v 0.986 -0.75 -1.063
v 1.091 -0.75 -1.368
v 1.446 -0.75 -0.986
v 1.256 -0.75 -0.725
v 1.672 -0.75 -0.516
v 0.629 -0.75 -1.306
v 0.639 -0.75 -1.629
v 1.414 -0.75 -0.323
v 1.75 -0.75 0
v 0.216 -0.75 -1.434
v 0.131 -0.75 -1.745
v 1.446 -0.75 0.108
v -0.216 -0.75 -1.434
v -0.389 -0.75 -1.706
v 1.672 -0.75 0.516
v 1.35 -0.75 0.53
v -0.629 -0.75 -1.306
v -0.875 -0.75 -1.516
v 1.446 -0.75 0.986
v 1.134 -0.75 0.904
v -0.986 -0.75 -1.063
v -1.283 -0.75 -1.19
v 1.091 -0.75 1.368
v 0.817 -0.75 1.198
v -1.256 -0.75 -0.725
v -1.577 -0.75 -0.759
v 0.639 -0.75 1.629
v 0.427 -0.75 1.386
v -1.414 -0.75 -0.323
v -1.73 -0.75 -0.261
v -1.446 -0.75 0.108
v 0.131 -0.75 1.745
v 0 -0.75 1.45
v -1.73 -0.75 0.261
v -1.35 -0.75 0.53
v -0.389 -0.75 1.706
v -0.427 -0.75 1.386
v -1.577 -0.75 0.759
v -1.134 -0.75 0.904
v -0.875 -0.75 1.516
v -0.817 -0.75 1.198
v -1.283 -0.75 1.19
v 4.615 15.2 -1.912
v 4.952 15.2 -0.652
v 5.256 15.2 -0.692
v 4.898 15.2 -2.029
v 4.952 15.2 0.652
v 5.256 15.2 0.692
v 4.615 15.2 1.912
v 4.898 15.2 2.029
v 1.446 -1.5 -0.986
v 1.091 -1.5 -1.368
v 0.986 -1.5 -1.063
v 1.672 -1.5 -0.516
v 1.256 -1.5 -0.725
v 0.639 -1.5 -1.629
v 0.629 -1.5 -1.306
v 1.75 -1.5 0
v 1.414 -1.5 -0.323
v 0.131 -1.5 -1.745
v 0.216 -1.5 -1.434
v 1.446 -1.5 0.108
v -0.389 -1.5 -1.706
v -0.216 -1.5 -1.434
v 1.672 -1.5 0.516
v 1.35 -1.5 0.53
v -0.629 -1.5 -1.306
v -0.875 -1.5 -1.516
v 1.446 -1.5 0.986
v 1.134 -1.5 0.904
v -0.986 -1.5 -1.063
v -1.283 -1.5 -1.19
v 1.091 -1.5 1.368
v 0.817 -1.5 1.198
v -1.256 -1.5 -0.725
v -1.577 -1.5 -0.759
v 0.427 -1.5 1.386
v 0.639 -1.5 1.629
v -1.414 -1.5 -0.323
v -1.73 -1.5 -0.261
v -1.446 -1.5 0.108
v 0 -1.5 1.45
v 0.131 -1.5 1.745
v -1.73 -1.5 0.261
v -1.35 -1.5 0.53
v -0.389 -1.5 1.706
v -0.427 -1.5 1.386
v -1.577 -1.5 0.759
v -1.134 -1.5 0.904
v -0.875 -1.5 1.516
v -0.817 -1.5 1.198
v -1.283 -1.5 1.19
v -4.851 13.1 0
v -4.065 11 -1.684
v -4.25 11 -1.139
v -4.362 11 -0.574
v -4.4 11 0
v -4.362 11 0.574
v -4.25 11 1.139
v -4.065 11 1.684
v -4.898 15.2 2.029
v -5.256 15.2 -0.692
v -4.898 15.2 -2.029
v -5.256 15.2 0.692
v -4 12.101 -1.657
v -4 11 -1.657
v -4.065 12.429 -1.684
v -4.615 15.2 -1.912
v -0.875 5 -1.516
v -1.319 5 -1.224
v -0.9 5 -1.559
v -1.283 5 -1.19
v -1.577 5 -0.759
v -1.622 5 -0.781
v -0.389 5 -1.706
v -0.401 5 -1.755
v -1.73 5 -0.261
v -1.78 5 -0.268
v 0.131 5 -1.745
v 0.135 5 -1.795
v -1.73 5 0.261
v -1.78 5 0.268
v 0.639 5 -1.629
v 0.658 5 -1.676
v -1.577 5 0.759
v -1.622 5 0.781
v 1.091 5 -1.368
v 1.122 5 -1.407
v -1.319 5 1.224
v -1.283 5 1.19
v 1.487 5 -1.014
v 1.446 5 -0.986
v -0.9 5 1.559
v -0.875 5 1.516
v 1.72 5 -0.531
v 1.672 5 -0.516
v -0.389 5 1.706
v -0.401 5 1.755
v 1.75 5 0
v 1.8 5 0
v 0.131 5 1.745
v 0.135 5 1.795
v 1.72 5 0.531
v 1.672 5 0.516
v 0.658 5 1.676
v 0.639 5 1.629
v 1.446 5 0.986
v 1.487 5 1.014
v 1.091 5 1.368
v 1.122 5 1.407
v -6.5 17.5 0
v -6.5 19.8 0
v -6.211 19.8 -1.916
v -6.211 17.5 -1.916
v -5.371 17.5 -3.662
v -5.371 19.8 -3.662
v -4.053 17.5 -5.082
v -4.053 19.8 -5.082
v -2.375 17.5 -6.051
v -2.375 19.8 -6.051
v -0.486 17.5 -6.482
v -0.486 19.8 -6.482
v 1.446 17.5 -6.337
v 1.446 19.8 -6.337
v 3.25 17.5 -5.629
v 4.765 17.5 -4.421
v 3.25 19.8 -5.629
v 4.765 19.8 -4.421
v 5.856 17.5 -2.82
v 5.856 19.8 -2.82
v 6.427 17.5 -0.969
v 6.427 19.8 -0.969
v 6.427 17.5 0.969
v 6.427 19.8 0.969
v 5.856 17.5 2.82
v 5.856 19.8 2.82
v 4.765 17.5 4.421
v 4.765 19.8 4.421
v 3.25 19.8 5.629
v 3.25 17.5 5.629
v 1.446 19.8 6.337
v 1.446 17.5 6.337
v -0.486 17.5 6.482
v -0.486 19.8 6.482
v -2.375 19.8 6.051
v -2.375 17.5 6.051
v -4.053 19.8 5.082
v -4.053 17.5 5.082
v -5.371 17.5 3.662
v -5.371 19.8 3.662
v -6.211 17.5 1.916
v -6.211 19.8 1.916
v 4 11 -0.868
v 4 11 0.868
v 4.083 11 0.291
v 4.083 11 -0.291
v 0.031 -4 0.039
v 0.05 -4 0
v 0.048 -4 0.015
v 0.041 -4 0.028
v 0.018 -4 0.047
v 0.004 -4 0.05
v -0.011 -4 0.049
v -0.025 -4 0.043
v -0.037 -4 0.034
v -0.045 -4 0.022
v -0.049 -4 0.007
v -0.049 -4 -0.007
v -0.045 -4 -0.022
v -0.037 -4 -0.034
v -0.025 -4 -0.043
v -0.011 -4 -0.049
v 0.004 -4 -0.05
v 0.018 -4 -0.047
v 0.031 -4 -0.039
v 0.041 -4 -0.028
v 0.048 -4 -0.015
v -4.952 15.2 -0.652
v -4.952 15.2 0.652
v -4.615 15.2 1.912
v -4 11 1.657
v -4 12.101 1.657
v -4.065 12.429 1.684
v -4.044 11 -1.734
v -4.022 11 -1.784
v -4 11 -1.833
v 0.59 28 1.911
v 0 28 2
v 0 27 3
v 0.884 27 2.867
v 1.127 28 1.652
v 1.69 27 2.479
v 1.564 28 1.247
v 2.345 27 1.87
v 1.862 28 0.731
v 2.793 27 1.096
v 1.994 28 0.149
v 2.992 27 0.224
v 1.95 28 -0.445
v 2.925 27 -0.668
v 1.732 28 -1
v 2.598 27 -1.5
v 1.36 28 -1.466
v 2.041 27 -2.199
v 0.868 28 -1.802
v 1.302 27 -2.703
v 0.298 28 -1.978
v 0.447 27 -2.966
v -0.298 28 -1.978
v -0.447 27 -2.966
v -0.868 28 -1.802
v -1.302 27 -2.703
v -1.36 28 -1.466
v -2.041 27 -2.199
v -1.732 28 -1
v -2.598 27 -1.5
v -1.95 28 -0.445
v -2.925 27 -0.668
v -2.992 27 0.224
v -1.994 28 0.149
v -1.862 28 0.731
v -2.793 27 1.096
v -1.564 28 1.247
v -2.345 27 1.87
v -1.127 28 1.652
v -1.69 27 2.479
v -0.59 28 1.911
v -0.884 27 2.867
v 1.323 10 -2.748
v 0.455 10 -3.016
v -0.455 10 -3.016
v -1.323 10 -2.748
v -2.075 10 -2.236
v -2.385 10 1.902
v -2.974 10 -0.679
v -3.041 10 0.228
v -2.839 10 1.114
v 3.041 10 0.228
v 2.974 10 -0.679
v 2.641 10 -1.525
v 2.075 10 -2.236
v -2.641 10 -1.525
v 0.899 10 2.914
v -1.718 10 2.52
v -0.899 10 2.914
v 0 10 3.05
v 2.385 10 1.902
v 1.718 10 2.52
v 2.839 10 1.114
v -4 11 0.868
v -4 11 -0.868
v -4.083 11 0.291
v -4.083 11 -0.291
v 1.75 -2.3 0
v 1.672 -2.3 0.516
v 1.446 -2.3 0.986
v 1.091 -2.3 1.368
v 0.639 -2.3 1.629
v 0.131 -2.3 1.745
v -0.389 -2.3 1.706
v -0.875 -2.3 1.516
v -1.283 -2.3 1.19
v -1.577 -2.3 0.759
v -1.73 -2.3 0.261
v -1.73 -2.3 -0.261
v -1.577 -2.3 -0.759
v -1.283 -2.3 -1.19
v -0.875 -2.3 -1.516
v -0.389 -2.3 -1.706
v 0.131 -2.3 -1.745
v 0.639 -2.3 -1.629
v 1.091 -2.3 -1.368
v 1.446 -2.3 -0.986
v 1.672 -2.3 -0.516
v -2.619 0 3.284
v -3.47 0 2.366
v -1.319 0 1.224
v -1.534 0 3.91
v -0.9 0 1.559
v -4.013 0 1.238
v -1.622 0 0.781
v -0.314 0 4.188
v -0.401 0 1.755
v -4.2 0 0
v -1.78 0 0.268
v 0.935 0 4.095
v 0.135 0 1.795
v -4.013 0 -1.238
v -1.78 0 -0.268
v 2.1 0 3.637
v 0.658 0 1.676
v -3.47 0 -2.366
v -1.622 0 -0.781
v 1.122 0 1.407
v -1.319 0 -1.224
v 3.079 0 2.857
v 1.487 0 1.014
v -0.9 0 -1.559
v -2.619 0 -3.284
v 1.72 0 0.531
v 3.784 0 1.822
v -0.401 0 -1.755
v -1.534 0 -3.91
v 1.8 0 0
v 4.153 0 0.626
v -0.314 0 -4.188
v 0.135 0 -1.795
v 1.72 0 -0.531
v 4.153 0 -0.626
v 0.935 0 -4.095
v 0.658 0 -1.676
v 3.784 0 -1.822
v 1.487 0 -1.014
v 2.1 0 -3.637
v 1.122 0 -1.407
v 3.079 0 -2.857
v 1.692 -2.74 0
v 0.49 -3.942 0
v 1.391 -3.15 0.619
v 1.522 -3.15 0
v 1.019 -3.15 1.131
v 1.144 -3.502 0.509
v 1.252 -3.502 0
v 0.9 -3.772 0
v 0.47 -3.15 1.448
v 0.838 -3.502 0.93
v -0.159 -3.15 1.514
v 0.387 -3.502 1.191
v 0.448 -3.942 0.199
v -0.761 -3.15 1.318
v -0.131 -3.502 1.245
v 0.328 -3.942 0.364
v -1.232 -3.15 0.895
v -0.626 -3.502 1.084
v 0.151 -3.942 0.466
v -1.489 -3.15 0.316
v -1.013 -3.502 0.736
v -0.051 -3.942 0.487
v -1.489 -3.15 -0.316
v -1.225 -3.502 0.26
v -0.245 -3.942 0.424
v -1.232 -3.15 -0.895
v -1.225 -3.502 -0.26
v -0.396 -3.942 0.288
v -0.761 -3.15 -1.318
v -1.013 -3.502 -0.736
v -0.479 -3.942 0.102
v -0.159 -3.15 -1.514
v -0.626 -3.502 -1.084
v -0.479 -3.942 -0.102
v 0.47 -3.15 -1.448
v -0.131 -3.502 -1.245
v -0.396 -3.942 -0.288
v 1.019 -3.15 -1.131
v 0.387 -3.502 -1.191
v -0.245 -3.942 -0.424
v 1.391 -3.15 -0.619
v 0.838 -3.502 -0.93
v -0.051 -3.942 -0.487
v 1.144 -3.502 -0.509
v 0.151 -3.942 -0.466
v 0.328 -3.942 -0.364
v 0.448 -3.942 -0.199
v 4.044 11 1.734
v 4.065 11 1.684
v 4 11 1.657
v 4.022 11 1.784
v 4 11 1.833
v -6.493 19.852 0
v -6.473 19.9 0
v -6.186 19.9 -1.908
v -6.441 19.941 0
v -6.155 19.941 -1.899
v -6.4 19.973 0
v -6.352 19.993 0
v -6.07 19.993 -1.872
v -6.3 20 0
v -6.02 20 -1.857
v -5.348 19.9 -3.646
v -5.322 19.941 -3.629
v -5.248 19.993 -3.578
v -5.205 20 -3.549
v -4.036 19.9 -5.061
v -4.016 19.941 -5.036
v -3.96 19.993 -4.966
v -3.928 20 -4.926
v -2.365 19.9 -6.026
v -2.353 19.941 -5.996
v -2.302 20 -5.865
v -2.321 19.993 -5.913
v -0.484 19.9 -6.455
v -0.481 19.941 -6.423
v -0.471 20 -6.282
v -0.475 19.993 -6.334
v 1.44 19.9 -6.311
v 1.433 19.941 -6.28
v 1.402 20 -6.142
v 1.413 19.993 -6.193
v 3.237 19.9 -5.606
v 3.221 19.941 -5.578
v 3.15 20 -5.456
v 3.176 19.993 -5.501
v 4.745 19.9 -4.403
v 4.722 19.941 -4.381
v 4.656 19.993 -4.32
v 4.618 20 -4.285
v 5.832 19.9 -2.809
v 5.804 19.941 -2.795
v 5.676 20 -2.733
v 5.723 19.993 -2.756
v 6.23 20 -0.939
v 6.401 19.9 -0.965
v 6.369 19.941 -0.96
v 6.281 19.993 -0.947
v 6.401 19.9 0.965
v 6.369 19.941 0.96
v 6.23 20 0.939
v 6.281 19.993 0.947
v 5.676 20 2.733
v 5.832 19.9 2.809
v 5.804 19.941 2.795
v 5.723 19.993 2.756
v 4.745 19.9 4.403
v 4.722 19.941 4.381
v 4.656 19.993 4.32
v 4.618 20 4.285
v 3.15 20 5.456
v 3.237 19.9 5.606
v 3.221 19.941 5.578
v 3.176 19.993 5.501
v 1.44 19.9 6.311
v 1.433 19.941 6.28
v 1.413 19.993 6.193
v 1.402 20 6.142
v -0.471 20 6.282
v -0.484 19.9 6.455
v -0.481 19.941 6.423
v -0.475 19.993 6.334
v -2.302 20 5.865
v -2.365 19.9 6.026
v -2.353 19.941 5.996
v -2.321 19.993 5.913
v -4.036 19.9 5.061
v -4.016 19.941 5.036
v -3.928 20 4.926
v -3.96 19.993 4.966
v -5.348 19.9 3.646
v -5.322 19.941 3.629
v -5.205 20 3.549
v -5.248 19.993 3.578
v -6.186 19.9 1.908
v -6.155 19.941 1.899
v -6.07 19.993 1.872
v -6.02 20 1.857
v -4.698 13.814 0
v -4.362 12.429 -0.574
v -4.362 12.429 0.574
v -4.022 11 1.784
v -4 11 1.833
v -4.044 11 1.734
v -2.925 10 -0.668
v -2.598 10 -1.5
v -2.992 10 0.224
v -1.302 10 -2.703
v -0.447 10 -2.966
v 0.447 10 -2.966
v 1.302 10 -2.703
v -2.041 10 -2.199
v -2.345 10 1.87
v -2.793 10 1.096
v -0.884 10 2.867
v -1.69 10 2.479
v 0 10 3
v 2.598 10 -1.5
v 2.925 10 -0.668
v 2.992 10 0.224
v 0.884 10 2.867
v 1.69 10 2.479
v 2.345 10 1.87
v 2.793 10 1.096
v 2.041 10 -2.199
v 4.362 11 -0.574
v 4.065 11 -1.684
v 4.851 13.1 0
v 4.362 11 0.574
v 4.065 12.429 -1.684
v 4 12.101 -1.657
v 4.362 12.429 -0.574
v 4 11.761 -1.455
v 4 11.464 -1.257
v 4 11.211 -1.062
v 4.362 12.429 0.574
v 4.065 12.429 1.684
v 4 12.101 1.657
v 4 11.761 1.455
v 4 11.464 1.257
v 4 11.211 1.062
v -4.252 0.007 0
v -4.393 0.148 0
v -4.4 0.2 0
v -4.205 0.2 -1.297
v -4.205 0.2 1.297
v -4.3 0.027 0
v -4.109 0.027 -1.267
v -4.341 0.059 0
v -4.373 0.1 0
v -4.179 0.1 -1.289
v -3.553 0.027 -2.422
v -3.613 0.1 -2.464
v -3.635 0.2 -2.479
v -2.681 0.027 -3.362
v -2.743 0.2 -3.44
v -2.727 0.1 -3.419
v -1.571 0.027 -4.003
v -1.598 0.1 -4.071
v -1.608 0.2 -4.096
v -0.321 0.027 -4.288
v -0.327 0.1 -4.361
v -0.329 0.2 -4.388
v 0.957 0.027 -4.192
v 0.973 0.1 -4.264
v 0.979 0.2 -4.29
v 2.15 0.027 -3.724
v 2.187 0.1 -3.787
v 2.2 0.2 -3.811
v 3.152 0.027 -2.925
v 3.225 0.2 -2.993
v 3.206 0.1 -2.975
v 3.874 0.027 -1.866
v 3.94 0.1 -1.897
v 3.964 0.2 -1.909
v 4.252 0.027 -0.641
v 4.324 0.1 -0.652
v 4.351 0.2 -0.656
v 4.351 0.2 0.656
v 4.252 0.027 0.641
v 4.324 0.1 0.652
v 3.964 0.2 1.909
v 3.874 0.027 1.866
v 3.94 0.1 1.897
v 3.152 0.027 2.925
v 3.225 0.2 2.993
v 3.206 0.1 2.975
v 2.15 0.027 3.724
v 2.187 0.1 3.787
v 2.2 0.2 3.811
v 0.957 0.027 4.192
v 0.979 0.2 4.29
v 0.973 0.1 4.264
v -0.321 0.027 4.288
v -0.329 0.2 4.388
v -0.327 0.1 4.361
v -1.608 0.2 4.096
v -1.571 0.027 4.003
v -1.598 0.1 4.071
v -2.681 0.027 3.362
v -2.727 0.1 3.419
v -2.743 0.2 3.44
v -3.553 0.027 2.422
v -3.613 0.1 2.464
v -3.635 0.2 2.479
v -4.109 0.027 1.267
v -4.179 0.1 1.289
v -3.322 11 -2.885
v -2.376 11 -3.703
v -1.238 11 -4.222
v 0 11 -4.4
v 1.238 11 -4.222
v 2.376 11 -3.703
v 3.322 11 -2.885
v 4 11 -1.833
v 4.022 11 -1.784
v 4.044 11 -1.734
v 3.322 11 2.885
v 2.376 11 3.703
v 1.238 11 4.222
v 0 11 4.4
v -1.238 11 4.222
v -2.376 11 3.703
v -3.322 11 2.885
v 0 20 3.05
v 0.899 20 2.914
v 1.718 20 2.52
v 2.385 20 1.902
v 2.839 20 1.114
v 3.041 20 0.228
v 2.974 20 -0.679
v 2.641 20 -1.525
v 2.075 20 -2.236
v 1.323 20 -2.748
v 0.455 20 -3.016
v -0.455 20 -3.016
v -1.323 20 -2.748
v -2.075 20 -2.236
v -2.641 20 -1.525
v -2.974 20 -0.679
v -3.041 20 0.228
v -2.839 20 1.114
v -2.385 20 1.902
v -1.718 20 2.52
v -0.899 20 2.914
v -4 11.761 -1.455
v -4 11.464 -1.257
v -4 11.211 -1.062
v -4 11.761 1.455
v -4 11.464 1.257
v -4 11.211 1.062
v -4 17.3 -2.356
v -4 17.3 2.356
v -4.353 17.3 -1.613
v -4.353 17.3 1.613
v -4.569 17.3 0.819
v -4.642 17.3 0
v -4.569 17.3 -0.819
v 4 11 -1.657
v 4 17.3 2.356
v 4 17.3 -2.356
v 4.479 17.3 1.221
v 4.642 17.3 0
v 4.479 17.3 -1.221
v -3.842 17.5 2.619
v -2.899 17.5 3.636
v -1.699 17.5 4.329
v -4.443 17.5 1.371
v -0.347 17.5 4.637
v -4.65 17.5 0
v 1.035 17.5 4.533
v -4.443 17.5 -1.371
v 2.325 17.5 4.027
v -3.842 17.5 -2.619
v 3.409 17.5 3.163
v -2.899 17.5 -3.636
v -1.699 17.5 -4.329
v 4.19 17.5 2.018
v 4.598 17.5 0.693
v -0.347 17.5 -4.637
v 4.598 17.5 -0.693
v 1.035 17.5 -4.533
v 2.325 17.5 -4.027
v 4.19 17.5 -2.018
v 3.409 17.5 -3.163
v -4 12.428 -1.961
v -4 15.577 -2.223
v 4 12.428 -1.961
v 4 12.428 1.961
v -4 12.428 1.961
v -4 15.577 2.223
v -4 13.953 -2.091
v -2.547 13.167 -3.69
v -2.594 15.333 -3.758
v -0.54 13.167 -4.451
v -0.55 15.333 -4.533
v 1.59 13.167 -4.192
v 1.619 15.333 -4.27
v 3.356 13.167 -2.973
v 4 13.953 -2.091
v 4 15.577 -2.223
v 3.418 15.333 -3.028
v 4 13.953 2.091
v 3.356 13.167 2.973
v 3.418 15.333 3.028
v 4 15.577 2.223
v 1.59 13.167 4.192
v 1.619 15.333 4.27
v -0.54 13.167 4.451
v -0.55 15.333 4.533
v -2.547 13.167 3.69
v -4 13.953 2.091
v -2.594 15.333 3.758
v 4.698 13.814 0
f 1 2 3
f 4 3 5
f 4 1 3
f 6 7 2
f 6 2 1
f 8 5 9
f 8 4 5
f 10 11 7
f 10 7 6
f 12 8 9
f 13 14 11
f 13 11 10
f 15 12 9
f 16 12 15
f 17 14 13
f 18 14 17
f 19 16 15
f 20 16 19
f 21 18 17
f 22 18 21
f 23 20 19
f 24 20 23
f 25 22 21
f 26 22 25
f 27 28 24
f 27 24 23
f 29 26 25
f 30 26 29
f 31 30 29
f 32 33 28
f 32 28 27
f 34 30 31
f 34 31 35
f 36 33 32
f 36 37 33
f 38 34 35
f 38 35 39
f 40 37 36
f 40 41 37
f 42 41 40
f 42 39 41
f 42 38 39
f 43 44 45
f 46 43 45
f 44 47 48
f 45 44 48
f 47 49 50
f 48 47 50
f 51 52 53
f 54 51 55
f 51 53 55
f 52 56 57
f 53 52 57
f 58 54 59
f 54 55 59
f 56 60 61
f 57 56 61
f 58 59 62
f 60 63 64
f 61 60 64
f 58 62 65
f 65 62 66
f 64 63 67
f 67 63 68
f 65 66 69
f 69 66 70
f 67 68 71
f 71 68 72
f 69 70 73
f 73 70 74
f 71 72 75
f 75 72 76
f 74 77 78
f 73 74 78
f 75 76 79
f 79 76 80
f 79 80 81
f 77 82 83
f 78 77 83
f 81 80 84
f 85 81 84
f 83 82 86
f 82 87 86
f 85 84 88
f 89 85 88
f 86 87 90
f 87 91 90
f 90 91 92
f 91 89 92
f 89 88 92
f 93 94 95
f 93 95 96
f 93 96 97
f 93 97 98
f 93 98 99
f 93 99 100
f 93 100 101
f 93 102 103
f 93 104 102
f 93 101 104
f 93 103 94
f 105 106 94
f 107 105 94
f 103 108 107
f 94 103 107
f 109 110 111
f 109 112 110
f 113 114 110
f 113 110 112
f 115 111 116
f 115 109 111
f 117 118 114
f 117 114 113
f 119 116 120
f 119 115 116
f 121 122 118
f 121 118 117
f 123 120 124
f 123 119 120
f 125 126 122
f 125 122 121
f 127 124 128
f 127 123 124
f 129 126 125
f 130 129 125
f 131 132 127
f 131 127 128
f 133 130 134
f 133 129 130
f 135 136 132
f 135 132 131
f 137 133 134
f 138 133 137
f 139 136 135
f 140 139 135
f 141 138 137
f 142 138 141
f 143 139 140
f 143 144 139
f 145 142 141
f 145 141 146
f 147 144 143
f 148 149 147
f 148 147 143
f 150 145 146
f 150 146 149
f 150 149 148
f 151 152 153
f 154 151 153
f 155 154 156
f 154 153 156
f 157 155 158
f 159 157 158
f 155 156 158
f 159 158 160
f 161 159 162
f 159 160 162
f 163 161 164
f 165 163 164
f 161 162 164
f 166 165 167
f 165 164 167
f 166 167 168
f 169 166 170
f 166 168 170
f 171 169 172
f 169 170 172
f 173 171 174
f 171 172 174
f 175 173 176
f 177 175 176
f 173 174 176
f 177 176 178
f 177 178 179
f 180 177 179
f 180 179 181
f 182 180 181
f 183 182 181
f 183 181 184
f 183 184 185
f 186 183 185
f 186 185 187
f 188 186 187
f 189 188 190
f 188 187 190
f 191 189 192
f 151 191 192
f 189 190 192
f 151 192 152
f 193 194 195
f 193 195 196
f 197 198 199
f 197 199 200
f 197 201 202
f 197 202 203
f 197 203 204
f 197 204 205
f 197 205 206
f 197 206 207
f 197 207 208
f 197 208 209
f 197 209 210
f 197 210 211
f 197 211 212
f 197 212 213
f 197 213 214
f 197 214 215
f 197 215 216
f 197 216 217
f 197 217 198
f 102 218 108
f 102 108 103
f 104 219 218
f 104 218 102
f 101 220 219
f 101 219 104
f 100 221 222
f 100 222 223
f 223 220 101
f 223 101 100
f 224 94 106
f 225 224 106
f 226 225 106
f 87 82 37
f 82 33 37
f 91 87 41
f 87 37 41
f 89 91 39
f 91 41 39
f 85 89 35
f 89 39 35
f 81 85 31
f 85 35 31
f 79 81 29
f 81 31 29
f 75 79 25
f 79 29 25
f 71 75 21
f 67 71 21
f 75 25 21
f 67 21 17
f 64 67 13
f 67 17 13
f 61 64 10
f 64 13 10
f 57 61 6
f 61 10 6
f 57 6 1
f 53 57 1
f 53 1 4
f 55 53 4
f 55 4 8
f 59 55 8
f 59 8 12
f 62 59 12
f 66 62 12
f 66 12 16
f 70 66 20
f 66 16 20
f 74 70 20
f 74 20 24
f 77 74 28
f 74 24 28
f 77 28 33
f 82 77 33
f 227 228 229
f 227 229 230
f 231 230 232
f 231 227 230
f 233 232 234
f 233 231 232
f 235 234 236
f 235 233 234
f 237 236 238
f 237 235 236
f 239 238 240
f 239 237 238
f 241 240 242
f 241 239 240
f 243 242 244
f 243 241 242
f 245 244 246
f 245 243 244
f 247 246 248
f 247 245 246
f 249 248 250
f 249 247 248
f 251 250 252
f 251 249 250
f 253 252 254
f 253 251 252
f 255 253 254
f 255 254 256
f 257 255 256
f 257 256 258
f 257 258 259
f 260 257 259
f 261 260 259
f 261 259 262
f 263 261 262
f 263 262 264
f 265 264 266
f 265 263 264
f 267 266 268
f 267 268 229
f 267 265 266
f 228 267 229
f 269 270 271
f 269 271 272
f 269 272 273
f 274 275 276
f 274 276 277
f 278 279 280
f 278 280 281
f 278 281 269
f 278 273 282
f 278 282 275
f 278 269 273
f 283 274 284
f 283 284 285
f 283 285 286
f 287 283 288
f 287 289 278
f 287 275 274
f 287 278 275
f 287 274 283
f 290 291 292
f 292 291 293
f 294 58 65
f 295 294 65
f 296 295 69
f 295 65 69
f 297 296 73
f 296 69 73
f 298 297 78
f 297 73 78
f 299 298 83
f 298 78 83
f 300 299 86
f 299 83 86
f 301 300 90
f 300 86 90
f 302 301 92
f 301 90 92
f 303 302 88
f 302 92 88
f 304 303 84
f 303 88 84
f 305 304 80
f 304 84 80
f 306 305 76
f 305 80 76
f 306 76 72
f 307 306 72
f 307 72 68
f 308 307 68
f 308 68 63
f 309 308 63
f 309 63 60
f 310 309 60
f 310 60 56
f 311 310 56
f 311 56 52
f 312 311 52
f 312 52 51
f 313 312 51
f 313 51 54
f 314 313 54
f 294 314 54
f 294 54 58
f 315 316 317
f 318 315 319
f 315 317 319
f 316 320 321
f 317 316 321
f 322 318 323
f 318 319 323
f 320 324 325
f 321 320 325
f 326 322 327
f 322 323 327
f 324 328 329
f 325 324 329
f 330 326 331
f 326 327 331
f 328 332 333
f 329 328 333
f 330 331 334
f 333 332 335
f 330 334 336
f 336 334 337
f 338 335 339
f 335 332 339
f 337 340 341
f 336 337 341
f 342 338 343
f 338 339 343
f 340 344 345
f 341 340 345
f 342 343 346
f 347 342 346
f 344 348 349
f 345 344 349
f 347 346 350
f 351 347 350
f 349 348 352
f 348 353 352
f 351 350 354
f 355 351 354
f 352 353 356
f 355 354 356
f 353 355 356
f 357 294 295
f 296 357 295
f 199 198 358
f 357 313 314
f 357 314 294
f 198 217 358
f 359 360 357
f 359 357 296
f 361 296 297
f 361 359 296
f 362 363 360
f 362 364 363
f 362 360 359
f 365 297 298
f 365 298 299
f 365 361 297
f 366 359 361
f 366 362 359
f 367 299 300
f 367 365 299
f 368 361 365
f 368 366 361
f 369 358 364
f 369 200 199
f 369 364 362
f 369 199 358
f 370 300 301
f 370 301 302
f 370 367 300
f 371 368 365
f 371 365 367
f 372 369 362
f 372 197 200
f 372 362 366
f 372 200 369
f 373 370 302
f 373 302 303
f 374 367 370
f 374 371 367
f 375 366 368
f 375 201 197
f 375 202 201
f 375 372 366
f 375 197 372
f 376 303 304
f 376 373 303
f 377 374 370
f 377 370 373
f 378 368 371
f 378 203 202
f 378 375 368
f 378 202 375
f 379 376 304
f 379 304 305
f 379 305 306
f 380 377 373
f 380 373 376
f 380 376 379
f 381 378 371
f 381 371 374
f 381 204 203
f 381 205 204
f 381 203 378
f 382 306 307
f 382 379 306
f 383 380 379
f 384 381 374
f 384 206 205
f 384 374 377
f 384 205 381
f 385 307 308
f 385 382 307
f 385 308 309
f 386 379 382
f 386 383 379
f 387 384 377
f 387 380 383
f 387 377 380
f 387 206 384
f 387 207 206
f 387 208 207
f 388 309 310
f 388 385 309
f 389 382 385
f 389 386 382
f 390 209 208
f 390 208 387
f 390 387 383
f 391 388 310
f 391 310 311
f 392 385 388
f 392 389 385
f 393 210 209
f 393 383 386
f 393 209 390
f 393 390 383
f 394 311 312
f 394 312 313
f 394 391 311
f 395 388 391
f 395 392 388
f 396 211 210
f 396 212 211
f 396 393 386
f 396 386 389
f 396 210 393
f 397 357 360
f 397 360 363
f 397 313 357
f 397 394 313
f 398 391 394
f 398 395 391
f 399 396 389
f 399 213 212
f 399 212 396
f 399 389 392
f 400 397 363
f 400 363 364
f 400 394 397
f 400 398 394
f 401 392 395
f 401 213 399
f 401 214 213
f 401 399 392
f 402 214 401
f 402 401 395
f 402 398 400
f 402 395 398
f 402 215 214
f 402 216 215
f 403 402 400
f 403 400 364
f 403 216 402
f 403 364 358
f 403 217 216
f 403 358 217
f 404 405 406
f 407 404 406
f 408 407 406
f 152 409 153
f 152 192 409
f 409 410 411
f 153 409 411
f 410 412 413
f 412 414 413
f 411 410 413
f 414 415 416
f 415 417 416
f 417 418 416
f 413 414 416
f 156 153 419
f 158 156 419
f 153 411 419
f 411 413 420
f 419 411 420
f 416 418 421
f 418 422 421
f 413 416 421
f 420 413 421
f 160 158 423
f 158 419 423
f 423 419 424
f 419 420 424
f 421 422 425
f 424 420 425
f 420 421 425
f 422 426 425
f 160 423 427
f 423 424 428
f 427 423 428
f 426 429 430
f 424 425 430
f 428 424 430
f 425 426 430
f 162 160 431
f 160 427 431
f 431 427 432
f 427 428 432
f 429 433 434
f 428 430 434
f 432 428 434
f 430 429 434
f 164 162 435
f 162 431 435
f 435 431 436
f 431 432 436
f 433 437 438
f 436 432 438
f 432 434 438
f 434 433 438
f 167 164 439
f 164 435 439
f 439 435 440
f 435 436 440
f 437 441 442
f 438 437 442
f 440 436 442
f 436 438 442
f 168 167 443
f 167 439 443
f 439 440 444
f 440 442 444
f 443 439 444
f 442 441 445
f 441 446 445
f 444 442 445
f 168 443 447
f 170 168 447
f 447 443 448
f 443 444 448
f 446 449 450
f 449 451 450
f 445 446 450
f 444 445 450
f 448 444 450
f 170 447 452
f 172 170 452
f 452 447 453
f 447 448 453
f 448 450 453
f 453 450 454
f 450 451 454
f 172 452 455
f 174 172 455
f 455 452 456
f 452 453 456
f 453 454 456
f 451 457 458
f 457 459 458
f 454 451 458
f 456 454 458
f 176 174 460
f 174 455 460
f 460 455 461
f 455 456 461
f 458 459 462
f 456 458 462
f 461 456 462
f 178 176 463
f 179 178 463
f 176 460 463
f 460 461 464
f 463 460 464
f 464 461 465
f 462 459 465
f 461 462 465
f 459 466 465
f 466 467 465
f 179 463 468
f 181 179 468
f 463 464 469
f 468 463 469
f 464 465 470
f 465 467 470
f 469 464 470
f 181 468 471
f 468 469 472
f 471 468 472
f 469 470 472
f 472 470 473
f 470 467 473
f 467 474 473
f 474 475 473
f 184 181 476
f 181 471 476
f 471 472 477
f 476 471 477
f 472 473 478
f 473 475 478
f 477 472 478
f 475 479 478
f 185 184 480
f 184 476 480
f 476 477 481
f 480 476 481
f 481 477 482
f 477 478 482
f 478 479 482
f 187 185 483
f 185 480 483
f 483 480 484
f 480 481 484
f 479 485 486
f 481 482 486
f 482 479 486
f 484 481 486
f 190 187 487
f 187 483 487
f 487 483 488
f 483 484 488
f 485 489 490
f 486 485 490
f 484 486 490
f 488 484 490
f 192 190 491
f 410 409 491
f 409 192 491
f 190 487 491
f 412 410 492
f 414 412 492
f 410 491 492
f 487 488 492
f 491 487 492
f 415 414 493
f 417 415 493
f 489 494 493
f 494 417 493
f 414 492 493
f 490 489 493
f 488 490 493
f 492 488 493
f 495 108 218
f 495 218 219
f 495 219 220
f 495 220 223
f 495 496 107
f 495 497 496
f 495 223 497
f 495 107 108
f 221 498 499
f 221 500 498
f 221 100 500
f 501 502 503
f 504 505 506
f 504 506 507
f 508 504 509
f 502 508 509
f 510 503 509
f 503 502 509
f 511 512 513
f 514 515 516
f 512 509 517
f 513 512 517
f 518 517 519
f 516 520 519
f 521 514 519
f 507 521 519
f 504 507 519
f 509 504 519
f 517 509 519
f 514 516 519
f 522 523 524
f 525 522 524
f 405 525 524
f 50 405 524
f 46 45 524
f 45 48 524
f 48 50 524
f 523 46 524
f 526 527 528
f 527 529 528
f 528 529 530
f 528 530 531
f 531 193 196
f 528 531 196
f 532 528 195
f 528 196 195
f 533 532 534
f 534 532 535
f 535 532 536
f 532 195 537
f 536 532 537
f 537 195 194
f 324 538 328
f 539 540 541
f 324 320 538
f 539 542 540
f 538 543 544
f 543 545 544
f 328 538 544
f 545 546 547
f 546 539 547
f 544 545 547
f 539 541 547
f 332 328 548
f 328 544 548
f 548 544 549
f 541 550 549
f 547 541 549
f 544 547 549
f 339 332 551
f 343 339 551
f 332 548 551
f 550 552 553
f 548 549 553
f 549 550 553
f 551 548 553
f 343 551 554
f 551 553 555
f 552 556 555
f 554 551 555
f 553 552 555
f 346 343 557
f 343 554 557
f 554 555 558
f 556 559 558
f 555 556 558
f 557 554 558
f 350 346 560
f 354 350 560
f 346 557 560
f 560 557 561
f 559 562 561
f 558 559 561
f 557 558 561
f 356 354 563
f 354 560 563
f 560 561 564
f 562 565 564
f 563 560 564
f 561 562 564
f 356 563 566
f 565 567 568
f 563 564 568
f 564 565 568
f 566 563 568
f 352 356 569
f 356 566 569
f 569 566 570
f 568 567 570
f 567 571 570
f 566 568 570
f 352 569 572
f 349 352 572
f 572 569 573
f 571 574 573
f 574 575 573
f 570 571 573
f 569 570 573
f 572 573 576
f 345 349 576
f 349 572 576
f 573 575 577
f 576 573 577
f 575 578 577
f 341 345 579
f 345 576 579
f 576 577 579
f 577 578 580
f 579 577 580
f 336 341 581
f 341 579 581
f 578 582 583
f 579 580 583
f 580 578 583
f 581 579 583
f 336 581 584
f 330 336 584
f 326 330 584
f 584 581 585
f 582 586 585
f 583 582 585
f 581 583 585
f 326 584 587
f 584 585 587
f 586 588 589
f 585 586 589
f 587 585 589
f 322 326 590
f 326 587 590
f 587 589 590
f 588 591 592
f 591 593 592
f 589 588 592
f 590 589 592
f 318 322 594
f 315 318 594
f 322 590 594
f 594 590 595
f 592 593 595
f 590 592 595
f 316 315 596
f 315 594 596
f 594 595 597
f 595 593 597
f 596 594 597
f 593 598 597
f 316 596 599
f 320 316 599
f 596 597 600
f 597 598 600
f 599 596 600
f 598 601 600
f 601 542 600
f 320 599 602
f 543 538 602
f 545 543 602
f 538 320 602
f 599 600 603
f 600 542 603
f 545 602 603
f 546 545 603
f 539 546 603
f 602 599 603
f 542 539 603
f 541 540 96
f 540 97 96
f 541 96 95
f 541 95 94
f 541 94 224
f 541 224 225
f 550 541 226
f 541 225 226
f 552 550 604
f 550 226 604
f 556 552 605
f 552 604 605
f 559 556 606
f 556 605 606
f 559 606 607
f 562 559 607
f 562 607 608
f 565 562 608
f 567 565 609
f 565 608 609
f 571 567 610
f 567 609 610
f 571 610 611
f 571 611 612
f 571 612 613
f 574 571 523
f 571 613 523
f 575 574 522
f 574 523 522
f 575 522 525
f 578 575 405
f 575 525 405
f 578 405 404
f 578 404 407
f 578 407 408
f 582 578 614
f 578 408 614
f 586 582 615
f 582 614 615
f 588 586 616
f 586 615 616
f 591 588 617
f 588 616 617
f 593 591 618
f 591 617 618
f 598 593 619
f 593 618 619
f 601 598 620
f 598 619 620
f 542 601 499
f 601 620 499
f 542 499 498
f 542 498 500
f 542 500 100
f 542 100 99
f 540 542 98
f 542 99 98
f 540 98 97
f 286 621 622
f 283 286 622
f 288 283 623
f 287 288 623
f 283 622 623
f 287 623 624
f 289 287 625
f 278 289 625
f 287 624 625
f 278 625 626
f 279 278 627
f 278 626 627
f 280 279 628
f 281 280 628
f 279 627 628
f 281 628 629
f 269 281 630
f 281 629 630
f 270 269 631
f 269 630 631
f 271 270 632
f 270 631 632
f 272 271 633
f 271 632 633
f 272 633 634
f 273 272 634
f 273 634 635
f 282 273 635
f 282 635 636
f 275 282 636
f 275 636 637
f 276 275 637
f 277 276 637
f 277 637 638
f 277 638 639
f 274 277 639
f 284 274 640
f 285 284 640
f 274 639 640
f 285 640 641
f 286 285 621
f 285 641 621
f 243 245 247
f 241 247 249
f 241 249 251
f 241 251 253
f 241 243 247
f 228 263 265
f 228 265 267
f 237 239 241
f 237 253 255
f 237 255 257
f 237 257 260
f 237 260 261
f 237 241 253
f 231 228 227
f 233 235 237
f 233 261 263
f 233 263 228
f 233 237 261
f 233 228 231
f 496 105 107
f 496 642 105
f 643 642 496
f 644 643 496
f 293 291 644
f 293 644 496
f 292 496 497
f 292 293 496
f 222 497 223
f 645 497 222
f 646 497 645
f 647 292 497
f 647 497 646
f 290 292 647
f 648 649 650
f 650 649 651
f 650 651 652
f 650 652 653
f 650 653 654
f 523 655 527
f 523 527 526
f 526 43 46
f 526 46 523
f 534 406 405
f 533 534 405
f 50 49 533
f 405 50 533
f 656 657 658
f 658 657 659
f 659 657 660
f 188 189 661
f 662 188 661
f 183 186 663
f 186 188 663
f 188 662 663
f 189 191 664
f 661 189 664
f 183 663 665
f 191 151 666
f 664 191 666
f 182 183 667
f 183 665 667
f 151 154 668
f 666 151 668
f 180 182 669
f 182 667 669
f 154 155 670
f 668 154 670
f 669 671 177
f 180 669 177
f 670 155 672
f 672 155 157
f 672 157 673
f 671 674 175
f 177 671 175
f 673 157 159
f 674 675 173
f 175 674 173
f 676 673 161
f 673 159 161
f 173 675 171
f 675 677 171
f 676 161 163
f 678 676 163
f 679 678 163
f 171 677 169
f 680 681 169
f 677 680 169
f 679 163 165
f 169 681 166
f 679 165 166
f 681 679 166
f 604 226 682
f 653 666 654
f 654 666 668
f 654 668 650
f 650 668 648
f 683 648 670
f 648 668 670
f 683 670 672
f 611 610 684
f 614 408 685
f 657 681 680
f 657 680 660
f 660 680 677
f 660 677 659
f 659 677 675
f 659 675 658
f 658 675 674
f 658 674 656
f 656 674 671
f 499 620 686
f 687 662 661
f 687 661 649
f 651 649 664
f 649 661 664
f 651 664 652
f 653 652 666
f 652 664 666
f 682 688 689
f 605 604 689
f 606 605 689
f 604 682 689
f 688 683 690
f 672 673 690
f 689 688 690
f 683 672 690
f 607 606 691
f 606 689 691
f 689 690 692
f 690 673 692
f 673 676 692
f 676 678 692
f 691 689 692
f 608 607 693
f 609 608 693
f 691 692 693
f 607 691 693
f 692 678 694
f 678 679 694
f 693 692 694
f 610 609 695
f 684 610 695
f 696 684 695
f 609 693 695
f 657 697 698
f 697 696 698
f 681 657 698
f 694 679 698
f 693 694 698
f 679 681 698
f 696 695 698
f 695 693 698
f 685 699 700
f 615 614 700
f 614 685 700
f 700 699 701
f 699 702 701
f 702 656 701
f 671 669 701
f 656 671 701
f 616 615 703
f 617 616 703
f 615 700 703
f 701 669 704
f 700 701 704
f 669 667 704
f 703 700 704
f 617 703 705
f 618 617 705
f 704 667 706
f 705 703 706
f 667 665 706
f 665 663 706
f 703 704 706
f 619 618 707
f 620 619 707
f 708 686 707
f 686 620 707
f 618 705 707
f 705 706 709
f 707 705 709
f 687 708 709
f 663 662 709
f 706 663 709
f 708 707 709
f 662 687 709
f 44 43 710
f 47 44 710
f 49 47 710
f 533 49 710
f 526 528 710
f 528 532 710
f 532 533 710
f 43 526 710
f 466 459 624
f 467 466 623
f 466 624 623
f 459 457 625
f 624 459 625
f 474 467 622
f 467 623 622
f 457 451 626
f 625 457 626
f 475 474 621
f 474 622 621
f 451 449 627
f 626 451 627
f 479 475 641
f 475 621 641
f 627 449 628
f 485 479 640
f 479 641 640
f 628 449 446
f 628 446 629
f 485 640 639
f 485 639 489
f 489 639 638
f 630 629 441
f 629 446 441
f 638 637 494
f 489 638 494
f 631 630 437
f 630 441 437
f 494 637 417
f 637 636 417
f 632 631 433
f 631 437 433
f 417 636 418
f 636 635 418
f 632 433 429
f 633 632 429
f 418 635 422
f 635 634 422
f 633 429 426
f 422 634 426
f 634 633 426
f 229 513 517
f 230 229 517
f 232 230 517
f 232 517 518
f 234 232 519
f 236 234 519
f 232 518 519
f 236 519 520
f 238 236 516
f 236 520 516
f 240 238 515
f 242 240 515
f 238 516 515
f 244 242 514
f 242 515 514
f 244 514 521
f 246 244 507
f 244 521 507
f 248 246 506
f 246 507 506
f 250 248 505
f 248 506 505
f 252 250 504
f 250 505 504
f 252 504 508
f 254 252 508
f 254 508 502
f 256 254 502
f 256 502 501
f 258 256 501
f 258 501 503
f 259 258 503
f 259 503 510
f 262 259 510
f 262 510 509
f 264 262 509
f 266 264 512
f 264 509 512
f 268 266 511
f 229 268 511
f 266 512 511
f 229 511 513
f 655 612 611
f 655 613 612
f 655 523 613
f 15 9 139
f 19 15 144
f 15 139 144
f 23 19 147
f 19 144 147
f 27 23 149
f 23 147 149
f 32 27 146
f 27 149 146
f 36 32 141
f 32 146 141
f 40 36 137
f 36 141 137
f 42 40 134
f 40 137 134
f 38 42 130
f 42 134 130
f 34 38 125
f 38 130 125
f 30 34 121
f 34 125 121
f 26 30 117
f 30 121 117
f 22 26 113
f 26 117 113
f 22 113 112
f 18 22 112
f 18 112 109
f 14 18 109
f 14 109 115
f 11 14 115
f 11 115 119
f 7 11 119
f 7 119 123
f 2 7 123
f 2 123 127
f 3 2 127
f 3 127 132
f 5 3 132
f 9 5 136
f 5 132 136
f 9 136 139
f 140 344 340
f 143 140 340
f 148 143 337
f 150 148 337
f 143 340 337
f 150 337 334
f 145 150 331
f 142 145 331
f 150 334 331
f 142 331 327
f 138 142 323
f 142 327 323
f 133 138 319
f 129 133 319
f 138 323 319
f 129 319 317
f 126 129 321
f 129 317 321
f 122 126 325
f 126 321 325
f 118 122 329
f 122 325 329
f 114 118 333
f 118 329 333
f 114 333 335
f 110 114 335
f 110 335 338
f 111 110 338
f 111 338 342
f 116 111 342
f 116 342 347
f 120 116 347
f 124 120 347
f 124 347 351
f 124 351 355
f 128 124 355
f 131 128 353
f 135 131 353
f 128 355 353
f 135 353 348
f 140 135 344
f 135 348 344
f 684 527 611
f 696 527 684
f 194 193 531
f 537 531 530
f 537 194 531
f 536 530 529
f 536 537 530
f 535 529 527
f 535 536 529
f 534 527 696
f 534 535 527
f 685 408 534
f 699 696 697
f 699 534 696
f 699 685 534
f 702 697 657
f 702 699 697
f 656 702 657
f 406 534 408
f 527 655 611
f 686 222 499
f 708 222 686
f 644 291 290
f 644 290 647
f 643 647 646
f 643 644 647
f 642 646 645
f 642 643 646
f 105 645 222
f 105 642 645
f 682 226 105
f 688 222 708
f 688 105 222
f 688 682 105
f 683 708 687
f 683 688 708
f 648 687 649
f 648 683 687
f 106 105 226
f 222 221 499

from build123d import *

# Parameters (mm, degrees)
FILLET1_R           = 0.2
CUT_EXTRUDE1_DEPTH  = 5
REVOLVE2_ANGLE      = 45.000276
SKETCH4_R           = 3.05
CUT_EXTRUDE2_DEPTH  = 10
SKETCH5_R           = 3
BOSS_EXTRUDE1_DEPTH = 18
CHAMFER1_SIZE       = 1
SKETCH6_R           = 1.8
CUT_EXTRUDE3_DEPTH  = 5
SKETCH7_R           = 1.75
BOSS_EXTRUDE2_DEPTH = 9
FILLET2_R           = 1.7
SKETCH8_W           = 0.3
SKETCH8_H           = 0.75


# Read off the part's stored shape, not the designer's step: Revolve2
with BuildPart() as part:
    # Sketch1 → Revolve1 (revolve)
    with BuildSketch(Plane.XY):
        Polygon((0, 0), (-4.4, 0), (-4.4, 11), (-4.65, 17.5), (-6.5, 17.5), (-6.5, 20), (0, 20), align=None)
    revolve(axis=Axis((0, 20, 0), (0, -1, 0)))

    # Fillet1
    fillet1_edges = [part.edges().sort_by_distance(p)[0] for p in [
        (6.5, 20, 0),
        (4.4, 0, 0),
    ]]
    fillet(fillet1_edges, radius=FILLET1_R)

    # Sketch2 → Cut-Extrude1 (cut, symmetric)
    with BuildSketch(Plane.XY):
        Polygon((-4, 11), (-4, 17.3), (-4.642307692, 17.3), (-4.4, 11), align=None)
        Polygon((4.4, 11), (4, 11), (4, 17.3), (4.642307692, 17.3), align=None)
    extrude(amount=CUT_EXTRUDE1_DEPTH, both=True, mode=Mode.SUBTRACT)

    # Revolve2 outline → Revolve2 (revolve)
    with BuildSketch(Plane(origin=(0, 0, 0), x_dir=(-0.923879239596717, 0, -0.3826841395226511), z_dir=(0.3826841395226511, 0, -0.923879239596717))):
        Polygon((4.4, 12.42897871), (4.093159214, 10.999987589), (4.4, 10.999987589), align=None)
        Polygon((4.995008841, 15.2), (4.4, 12.42897871), (4.4, 10.999987589), (5.301846962, 15.2), align=None)
    revolve2 = revolve(axis=Axis((0, 0, 0), (0, 1, 0)), revolution_arc=REVOLVE2_ANGLE)

    # Mirror1: Revolve2 across plane
    add(revolve2.mirror(Plane(origin=(0, 0, 0), x_dir=(0, 0, 1), z_dir=(1, 0, 0))))

    # Sketch4 → Cut-Extrude2 (cut)
    with BuildSketch(Plane(origin=(0, 20, 0), x_dir=(1, 0, 0), z_dir=(0, 1, 0))):
        with Locations(Location((0, 0, 0), (0, 0, 270))):
            Circle(SKETCH4_R)
    extrude(amount=-CUT_EXTRUDE2_DEPTH, mode=Mode.SUBTRACT)

    # Sketch6 → Cut-Extrude3 (cut)
    with BuildSketch(Plane(origin=(0, 0, 0), x_dir=(-1, 0, 0), z_dir=(0, -1, 0))):
        with Locations(Location((0, 0, 0), (0, 0, 180))):
            Circle(SKETCH6_R)
    extrude(amount=-CUT_EXTRUDE3_DEPTH, mode=Mode.SUBTRACT)

    # Sketch7 → Boss-Extrude2 (add)
    with BuildSketch(Plane(origin=(0, 5, 0), x_dir=(-1, 0, 0), z_dir=(0, -1, 0))):
        with Locations(Location((0, 0, 0), (0, 0, 180))):
            Circle(SKETCH7_R)
    extrude(amount=BOSS_EXTRUDE2_DEPTH)

    # Fillet2
    fillet2_edges = [part.edges().sort_by_distance(p)[0] for p in [
        (-1.75, -4, 0),
    ]]
    fillet(fillet2_edges, radius=FILLET2_R)

    # Sketch8 → Cut-Revolve1 (revolve, cut)
    with BuildSketch(Plane.XY, mode=Mode.PRIVATE) as cut_revolve1_sk:
        with Locations((-1.6, -1.125)):
            Rectangle(SKETCH8_W, SKETCH8_H)
    revolve(cut_revolve1_sk.sketch.rotate(Axis((0, 0, 0), (0, -1, 0)), 270), axis=Axis((0, 0, 0), (0, -1, 0)), mode=Mode.SUBTRACT)


with BuildPart() as body_2:
    # Sketch5 → Boss-Extrude1 (new body)
    with BuildSketch(Plane(origin=(0, 10, 0), x_dir=(1, 0, 0), z_dir=(0, 1, 0))):
        with Locations(Location((0, 0, 0), (0, 0, 270))):
            Circle(SKETCH5_R)
    extrude(amount=BOSS_EXTRUDE1_DEPTH)

    # Chamfer1
    chamfer1_edges = [body_2.edges().sort_by_distance(p)[0] for p in [
        (0, 28, -3),
    ]]
    chamfer(chamfer1_edges, length=CHAMFER1_SIZE)


solid = Compound([part.part, body_2.part])
